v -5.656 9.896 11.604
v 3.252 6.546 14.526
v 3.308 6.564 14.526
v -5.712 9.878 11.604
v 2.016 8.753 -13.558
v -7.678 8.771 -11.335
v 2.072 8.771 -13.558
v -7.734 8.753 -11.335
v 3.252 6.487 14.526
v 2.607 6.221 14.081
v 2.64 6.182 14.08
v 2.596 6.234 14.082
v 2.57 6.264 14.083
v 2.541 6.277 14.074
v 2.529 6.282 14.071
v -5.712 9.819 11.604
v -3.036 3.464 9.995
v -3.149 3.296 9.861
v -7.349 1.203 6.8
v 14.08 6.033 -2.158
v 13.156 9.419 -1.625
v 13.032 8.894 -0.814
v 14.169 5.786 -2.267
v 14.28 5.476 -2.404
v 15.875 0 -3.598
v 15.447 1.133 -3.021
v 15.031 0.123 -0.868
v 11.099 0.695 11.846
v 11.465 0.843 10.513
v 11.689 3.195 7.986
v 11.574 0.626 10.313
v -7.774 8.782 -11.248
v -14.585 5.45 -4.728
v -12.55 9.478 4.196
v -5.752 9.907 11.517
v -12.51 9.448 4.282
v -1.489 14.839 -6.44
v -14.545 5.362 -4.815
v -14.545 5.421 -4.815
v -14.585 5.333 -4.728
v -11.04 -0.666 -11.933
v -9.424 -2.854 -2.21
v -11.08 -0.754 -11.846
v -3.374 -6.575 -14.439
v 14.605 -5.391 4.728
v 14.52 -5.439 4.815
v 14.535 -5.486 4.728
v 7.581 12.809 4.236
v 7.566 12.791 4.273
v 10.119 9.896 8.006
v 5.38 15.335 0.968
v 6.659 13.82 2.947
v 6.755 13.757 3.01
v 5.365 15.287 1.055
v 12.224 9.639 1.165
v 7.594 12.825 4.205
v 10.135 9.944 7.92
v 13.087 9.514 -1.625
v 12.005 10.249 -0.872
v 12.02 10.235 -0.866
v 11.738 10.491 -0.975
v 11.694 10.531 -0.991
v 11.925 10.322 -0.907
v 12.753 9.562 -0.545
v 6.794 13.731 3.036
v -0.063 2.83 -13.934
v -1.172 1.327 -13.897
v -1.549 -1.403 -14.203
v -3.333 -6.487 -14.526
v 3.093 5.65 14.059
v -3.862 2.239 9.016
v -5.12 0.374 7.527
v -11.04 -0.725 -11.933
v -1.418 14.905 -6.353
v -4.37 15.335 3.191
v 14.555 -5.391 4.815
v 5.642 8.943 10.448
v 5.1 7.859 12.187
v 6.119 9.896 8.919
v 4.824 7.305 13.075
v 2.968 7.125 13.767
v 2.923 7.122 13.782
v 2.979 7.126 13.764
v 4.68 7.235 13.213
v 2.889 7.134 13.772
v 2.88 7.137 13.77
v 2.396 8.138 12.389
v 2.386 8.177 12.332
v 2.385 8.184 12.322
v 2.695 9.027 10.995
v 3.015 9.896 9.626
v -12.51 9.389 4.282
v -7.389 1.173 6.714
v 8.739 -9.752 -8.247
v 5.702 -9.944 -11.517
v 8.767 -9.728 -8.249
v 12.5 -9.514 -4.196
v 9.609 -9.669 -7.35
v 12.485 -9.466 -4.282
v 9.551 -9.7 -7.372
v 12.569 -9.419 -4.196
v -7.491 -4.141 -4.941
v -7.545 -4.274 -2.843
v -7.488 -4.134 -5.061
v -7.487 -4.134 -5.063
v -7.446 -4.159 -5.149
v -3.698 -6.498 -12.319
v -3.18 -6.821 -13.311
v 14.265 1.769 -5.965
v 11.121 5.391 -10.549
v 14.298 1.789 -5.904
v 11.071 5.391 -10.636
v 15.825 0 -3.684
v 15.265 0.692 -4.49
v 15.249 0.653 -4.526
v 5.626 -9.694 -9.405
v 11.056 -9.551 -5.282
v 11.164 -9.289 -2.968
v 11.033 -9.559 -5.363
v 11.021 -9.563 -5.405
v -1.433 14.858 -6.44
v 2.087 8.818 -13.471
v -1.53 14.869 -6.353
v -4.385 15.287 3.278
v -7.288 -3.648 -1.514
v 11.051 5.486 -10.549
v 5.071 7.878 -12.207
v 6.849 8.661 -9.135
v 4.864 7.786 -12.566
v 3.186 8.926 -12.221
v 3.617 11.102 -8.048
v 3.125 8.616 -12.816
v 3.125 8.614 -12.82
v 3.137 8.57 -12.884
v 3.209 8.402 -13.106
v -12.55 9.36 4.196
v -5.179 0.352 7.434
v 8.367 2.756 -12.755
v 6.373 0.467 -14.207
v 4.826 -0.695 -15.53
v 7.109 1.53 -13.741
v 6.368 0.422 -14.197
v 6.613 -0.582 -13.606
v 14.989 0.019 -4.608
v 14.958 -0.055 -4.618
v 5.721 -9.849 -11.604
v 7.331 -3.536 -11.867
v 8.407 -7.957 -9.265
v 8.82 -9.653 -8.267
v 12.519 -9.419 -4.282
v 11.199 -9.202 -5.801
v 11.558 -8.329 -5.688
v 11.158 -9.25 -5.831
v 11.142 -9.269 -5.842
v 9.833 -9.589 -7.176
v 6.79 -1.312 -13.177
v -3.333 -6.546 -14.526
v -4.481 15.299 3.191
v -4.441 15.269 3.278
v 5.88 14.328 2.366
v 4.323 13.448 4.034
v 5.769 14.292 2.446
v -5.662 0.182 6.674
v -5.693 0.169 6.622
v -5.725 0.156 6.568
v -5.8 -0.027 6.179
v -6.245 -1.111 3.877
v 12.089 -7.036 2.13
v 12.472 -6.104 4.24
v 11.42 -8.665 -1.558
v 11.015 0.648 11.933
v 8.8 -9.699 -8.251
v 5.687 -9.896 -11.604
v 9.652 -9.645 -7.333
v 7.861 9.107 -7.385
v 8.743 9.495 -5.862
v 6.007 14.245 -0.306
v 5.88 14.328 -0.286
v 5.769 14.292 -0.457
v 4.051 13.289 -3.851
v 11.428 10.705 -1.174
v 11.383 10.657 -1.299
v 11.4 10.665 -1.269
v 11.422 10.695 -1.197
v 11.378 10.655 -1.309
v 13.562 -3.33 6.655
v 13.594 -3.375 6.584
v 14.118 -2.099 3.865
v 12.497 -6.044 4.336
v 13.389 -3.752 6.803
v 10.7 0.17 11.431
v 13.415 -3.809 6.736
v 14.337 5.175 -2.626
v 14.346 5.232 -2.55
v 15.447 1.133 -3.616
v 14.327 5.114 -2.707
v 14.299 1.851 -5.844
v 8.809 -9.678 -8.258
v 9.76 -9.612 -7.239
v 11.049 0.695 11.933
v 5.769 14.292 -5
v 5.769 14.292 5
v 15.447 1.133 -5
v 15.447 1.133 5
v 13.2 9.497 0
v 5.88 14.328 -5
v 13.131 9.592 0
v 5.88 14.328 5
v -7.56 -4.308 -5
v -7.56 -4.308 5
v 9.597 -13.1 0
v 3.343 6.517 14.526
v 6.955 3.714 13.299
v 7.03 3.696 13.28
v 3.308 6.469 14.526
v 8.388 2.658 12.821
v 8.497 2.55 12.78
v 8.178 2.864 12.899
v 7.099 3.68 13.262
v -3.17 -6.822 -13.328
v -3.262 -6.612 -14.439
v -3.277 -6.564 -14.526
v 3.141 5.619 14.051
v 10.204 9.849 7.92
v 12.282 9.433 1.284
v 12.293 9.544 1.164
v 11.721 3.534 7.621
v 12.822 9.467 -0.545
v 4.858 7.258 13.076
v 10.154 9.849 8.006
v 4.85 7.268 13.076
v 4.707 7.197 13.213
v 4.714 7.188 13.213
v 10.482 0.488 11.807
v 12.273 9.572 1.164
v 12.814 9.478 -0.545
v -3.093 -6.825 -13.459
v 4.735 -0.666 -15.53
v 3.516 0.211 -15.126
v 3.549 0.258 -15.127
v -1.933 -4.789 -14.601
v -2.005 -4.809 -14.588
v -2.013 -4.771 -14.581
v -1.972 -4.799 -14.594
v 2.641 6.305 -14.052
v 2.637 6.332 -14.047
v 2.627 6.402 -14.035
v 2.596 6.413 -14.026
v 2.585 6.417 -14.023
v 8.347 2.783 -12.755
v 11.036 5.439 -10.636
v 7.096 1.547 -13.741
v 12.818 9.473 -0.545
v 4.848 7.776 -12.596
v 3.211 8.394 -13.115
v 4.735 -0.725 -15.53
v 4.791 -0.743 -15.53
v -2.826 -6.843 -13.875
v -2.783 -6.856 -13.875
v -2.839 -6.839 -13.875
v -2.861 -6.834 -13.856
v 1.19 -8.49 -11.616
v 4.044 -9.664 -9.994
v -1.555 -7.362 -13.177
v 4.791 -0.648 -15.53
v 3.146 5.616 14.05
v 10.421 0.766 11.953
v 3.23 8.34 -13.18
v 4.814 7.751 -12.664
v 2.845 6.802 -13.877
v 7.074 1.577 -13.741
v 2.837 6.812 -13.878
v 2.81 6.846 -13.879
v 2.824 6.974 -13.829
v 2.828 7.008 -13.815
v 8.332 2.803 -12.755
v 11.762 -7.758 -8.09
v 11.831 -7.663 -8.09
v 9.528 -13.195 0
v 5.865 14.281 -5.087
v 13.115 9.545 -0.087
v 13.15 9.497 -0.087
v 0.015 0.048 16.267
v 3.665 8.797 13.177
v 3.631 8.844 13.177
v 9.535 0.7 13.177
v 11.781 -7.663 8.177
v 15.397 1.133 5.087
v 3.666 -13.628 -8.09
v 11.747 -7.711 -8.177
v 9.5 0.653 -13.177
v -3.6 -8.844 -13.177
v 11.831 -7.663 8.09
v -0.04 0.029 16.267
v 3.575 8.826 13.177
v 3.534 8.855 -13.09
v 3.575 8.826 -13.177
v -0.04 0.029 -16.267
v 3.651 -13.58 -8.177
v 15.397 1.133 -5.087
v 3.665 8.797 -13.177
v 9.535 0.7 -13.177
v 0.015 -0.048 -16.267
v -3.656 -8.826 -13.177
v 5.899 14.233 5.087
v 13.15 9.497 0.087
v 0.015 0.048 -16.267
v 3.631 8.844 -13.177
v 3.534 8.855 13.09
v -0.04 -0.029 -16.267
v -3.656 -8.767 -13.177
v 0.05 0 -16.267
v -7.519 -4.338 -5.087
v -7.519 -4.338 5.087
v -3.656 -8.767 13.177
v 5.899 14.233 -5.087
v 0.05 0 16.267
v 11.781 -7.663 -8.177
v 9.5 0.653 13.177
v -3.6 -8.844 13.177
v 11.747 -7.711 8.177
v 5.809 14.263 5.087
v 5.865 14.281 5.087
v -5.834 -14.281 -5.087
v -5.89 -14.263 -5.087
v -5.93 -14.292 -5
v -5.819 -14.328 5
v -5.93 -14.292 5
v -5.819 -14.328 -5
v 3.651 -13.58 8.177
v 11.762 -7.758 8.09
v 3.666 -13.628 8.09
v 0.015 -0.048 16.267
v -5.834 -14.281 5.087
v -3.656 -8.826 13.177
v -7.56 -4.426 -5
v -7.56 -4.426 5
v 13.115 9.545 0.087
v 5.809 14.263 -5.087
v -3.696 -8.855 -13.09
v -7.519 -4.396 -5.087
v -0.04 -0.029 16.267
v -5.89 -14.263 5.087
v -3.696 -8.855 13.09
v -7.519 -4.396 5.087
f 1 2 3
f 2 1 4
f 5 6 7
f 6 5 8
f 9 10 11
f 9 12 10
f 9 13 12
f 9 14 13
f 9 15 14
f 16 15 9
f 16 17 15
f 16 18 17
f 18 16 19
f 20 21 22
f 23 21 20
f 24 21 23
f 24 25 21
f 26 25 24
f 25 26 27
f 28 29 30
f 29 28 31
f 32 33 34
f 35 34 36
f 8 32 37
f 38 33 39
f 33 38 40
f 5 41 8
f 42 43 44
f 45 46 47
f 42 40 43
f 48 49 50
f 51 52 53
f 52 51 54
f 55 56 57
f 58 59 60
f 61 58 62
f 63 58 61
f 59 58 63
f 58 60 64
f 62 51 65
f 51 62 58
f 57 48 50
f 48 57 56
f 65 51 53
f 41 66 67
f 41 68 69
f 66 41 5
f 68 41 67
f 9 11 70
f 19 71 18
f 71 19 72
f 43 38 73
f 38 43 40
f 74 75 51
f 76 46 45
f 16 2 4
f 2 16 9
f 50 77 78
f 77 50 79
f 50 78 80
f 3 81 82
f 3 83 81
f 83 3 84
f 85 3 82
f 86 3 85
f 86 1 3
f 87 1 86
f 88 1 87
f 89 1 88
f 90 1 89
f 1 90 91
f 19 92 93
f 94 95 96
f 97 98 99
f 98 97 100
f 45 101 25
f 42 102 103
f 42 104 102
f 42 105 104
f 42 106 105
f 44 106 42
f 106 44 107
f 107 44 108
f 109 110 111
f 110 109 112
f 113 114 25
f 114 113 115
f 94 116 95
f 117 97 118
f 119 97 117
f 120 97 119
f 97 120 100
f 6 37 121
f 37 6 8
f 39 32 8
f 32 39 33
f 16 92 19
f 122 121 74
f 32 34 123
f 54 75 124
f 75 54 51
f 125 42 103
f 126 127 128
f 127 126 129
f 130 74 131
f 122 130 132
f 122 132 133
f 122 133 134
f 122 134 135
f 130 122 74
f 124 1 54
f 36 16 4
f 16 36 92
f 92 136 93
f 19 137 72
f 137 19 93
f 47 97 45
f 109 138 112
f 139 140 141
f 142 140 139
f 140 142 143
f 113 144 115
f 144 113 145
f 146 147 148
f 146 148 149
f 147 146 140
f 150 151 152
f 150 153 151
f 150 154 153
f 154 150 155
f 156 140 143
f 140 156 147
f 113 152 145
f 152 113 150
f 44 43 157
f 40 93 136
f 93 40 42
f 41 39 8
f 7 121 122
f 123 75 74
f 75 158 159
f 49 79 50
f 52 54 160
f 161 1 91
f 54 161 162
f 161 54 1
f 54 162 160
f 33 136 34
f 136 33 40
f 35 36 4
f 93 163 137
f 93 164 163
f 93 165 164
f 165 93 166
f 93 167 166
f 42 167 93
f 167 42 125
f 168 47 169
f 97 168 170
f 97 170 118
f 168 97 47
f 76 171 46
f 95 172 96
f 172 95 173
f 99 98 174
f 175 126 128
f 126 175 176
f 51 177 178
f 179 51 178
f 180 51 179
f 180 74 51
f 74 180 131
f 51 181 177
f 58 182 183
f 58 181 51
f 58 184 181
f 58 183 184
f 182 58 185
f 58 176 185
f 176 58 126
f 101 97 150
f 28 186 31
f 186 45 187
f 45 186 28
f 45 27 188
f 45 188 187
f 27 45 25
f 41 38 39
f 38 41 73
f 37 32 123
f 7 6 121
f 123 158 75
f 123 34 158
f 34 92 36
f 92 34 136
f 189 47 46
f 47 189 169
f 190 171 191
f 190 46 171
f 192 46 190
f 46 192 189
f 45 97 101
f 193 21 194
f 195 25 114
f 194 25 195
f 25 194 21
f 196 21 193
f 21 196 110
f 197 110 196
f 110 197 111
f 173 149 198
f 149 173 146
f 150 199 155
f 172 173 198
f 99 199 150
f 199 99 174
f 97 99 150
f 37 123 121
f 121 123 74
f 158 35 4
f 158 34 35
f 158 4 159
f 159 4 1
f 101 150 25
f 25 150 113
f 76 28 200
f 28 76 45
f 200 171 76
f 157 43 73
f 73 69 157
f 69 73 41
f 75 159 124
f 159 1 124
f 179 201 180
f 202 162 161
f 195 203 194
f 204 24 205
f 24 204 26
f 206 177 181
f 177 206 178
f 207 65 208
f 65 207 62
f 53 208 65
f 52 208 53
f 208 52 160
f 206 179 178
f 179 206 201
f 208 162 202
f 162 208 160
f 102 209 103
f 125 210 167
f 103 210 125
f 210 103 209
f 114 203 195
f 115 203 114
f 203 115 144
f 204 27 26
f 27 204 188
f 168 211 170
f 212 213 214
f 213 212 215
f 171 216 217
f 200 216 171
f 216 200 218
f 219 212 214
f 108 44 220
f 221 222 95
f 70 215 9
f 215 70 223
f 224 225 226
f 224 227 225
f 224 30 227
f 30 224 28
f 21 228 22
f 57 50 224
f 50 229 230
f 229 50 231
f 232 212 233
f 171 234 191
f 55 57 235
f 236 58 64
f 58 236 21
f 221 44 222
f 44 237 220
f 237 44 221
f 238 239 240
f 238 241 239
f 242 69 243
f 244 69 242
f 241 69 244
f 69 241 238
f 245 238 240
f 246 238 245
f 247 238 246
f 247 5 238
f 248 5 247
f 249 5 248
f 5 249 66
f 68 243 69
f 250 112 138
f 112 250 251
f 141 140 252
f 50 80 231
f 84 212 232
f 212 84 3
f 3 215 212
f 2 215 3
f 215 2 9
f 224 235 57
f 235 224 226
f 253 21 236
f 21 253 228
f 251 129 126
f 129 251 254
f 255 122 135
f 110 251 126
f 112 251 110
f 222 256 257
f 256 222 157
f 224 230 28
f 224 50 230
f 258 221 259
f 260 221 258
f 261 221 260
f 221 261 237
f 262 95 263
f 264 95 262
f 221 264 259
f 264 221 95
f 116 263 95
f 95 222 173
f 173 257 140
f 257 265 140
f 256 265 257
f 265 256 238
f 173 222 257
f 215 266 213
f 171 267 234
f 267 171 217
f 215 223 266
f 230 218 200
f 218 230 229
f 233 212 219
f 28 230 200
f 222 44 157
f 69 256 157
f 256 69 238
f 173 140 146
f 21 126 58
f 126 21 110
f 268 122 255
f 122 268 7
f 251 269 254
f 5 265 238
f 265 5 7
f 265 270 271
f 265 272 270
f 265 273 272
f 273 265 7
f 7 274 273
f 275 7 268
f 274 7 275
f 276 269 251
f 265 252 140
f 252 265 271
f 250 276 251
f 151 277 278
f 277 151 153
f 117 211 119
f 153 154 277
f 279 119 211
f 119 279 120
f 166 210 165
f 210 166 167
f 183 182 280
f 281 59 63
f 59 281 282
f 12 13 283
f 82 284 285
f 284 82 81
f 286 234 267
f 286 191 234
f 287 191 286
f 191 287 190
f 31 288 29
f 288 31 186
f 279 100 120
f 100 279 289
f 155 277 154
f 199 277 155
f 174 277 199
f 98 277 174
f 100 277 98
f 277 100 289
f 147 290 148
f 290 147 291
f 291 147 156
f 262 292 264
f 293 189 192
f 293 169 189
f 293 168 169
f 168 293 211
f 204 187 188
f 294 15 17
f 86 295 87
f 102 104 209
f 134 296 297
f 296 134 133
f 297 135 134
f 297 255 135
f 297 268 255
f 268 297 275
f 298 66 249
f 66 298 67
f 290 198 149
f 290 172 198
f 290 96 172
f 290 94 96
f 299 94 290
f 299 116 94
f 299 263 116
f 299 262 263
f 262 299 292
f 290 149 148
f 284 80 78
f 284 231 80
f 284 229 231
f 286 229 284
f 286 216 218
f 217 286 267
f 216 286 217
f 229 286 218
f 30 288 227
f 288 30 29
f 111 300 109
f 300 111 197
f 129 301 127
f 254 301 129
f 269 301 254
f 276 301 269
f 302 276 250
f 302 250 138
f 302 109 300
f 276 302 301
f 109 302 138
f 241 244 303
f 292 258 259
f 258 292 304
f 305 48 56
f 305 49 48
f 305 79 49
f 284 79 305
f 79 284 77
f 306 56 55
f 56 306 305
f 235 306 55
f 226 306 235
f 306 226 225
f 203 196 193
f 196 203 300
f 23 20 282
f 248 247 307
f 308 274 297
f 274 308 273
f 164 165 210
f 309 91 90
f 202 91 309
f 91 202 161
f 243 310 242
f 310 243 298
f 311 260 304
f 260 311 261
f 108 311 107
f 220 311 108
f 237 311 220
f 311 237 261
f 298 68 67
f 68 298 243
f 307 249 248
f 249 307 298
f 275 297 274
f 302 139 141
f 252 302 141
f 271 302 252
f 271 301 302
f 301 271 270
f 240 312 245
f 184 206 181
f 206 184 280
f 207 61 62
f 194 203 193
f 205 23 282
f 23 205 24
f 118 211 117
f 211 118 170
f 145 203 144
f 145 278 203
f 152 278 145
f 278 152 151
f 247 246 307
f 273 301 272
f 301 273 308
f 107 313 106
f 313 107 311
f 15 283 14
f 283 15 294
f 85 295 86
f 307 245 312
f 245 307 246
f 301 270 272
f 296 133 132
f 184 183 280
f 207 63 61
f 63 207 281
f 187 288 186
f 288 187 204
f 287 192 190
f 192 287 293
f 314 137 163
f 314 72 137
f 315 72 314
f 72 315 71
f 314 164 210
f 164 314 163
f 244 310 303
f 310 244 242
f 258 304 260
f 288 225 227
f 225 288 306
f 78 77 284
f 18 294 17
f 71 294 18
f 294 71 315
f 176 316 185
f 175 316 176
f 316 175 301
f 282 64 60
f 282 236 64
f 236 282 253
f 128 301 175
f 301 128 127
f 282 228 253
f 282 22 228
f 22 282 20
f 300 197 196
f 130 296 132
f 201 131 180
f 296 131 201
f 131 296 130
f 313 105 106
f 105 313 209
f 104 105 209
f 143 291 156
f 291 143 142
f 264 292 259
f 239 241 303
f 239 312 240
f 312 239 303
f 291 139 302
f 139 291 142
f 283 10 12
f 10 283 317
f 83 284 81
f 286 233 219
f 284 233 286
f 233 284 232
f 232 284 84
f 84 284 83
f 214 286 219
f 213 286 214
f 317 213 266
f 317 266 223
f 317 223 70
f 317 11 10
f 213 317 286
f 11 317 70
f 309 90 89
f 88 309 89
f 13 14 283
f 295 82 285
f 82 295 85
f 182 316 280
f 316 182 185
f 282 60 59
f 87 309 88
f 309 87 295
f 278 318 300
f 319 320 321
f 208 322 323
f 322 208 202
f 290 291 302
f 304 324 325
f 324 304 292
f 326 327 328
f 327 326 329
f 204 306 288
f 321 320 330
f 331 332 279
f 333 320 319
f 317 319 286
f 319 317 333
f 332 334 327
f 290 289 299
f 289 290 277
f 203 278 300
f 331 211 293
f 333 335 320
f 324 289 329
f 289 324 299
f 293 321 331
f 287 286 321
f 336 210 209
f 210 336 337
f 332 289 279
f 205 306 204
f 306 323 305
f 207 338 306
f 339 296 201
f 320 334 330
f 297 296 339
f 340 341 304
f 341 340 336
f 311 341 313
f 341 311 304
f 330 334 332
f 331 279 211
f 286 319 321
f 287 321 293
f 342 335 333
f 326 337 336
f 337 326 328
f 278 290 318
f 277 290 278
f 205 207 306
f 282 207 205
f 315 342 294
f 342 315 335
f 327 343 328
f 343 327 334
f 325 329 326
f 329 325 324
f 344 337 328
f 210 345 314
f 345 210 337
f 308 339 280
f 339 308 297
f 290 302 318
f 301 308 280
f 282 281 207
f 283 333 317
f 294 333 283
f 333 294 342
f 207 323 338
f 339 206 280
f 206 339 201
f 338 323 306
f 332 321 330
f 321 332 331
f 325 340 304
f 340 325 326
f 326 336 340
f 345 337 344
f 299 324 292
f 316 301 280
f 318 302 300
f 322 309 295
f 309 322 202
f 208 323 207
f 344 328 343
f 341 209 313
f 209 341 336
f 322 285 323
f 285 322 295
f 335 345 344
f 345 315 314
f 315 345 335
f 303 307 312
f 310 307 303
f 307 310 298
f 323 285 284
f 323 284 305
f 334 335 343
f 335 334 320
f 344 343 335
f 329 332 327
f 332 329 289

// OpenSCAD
// Auto-generated OpenSCAD file

    inner_points = 10*[[1.6796923234637004e-13, 6.070021975389176e-13, -1.618033988749895], [-1.6796923234637004e-13, -6.070021975389176e-13, 1.618033988749895], [1.3099900587145907, 0.9497157652786637, 4.92274937759846e-13], [0.9497157652786637, -1.3099900587145907, -3.9284948324472034e-13], [0.948473340654347, 0.0700486920347792, -1.3090169943748227], [0.9484733406540753, 0.07004869203379704, 1.3090169943750722], [0.3615167180605155, 0.8796670732448667, -1.3090169943745797], [0.36151671806024377, 0.8796670732438845, 1.3090169943753152], [-0.36151671806024377, -0.8796670732438845, -1.3090169943753152], [-0.3615167180605155, -0.8796670732448667, 1.3090169943745797], [1.5346621026017229, 0.11334116457913979, -0.49999999999979816], [1.5346621026016192, 0.11334116457876464, 0.5000000000002018], [0.5849463373230591, 1.4233312232937305, -0.49999999999940536], [0.5849463373229553, 1.4233312232933555, 0.5000000000005946], [-0.5849463373229553, -1.4233312232933555, -0.5000000000005946], [-0.5849463373230591, -1.4233312232937305, 0.49999999999940536], [1.173145384541375, -0.7663259086651197, -0.8090169943751132], [1.1731453845412072, -0.766325908665727, 0.8090169943747817], [0.36352700333128773, -1.3532825312589511, -0.8090169943754174], [0.36352700333111987, -1.3532825312595584, 0.8090169943744775], [-0.1629176159415796, 0.9866396760803366, 3.5322329978742213e-13], [-0.7478639532645349, -0.4366915472130185, -0.5000000000002415], [-0.7478639532646387, -0.4366915472133937, 0.4999999999997586], [-0.3863472352041232, 0.4429755260314729, -0.8090169943748214], [-0.38634723520429115, 0.44297552603086593, 0.8090169943750735]];

    outer_points = 10*[[0.3292875792170331, 0.6516523075520398, 1.4439366152935462], [-0.3292875792170331, -0.6516523075520398, -1.4439366152935462], [1.5775331980706784, 0.0, -0.35975407952487837], [-0.14488853615168673, 1.4810075147722905, -0.6353408864772672], [1.0103928266975255, 0.9848542820948938, 0.7919610896675606], [0.4775943314511925, -0.06954130037160627, -1.5443774314778784], [1.0999388666194858, 0.06954130037160627, 1.184623351953], [0.5671403713731528, -0.9848542820948938, -1.151715169192439], [-0.5671403713731528, 0.9848542820948938, 1.151715169192439], [-1.0999388666194858, -0.06954130037160627, -1.184623351953], [1.3055623563686454, 0.9418753948433755, -0.16251665444403007], [1.1020514403393455, 0.5391321199289151, -1.0549185602959228], [1.450450892520332, -0.5391321199289151, 0.4728242320332371], [1.2469399764910323, -0.9418753948433755, -0.41957767381865574], [-1.2469399764910323, 0.9418753948433755, 0.41957767381865574], [-1.450450892520332, 0.5391321199289151, -0.4728242320332371], [0.5349110689661927, 1.523986402023809, 0.09679660889651609], [0.20562348974915956, 0.8723340944717692, -1.34714000639703], [-0.4400580658228066, 1.523986402023809, 0.31913685763432353], [-0.7693456450398397, 0.8723340944717692, -1.1247997576592228], [0.5161118652230368, -0.8186808191285174, 0.25177422220524803], [-0.7308281112679954, 0.12319457571485803, 0.6713518960239038], [-0.9343390272972953, -0.27954869919960235, -0.22105000982798903], [0.16559983932219047, -0.21000739882799596, 0.9635733421250111], [-0.16368773989484264, -0.8616597063800358, -0.48036327316853505]];

    // Convex hull for inner set (I)
    module inner_hull() {
        hull() {
            for (p = inner_points) {
                translate(p) sphere(r=0.1);
            }
        }
    }

    // Convex hull for outer set (O) minus inner hull (O \ I)
    module outer_minus_inner() {
        difference() {
            hull() {
                for (p = outer_points) {
                    translate(p) sphere(r=0.1);
                }
            }
            inner_hull(); // Subtract inner hull
        }
    }

    // Convex hull for outer set (O) minus all translated inner hulls
    module outer_minus_AllTranslationInner() {
        difference() {
            hull() {
                for (p = outer_points) {
                    translate(p) sphere(r=0.1);
                }
            }
            hull() {
                translate([0,0,50]) inner_hull();
                translate([0,0,-50]) inner_hull();
            }; // Subtract translated inner hulls
        }
    }

    // Difference between outer_minus_inner and outer_minus_AllTranslationInner
    module outer_minus_inner_diff() {
        difference() {
            // Outer minus inner
            difference() {
                hull() {
                    for (p = outer_points) {
                        translate(p) sphere(r=0.1);
                    }
                }
                inner_hull();
            }

            // Subtract Outer minus AllTranslationInner
            difference() {
                hull() {
                    for (p = outer_points) {
                        translate(p) sphere(r=0.1);
                    }
                }
                hull() {
                    translate([0,0,50]) inner_hull();
                    translate([0,0,-50]) inner_hull();
                };
            }
        }
    }

    // Rendering all with colors applied
    color([1, 0, 0, 0.5]) inner_hull(); // Transparent red
    color([0, 1, 0, 1]) outer_minus_AllTranslationInner(); // Opaque green
    color([1, 1, 0, 1]) outer_minus_inner_diff(); // Opaque yellow
    
